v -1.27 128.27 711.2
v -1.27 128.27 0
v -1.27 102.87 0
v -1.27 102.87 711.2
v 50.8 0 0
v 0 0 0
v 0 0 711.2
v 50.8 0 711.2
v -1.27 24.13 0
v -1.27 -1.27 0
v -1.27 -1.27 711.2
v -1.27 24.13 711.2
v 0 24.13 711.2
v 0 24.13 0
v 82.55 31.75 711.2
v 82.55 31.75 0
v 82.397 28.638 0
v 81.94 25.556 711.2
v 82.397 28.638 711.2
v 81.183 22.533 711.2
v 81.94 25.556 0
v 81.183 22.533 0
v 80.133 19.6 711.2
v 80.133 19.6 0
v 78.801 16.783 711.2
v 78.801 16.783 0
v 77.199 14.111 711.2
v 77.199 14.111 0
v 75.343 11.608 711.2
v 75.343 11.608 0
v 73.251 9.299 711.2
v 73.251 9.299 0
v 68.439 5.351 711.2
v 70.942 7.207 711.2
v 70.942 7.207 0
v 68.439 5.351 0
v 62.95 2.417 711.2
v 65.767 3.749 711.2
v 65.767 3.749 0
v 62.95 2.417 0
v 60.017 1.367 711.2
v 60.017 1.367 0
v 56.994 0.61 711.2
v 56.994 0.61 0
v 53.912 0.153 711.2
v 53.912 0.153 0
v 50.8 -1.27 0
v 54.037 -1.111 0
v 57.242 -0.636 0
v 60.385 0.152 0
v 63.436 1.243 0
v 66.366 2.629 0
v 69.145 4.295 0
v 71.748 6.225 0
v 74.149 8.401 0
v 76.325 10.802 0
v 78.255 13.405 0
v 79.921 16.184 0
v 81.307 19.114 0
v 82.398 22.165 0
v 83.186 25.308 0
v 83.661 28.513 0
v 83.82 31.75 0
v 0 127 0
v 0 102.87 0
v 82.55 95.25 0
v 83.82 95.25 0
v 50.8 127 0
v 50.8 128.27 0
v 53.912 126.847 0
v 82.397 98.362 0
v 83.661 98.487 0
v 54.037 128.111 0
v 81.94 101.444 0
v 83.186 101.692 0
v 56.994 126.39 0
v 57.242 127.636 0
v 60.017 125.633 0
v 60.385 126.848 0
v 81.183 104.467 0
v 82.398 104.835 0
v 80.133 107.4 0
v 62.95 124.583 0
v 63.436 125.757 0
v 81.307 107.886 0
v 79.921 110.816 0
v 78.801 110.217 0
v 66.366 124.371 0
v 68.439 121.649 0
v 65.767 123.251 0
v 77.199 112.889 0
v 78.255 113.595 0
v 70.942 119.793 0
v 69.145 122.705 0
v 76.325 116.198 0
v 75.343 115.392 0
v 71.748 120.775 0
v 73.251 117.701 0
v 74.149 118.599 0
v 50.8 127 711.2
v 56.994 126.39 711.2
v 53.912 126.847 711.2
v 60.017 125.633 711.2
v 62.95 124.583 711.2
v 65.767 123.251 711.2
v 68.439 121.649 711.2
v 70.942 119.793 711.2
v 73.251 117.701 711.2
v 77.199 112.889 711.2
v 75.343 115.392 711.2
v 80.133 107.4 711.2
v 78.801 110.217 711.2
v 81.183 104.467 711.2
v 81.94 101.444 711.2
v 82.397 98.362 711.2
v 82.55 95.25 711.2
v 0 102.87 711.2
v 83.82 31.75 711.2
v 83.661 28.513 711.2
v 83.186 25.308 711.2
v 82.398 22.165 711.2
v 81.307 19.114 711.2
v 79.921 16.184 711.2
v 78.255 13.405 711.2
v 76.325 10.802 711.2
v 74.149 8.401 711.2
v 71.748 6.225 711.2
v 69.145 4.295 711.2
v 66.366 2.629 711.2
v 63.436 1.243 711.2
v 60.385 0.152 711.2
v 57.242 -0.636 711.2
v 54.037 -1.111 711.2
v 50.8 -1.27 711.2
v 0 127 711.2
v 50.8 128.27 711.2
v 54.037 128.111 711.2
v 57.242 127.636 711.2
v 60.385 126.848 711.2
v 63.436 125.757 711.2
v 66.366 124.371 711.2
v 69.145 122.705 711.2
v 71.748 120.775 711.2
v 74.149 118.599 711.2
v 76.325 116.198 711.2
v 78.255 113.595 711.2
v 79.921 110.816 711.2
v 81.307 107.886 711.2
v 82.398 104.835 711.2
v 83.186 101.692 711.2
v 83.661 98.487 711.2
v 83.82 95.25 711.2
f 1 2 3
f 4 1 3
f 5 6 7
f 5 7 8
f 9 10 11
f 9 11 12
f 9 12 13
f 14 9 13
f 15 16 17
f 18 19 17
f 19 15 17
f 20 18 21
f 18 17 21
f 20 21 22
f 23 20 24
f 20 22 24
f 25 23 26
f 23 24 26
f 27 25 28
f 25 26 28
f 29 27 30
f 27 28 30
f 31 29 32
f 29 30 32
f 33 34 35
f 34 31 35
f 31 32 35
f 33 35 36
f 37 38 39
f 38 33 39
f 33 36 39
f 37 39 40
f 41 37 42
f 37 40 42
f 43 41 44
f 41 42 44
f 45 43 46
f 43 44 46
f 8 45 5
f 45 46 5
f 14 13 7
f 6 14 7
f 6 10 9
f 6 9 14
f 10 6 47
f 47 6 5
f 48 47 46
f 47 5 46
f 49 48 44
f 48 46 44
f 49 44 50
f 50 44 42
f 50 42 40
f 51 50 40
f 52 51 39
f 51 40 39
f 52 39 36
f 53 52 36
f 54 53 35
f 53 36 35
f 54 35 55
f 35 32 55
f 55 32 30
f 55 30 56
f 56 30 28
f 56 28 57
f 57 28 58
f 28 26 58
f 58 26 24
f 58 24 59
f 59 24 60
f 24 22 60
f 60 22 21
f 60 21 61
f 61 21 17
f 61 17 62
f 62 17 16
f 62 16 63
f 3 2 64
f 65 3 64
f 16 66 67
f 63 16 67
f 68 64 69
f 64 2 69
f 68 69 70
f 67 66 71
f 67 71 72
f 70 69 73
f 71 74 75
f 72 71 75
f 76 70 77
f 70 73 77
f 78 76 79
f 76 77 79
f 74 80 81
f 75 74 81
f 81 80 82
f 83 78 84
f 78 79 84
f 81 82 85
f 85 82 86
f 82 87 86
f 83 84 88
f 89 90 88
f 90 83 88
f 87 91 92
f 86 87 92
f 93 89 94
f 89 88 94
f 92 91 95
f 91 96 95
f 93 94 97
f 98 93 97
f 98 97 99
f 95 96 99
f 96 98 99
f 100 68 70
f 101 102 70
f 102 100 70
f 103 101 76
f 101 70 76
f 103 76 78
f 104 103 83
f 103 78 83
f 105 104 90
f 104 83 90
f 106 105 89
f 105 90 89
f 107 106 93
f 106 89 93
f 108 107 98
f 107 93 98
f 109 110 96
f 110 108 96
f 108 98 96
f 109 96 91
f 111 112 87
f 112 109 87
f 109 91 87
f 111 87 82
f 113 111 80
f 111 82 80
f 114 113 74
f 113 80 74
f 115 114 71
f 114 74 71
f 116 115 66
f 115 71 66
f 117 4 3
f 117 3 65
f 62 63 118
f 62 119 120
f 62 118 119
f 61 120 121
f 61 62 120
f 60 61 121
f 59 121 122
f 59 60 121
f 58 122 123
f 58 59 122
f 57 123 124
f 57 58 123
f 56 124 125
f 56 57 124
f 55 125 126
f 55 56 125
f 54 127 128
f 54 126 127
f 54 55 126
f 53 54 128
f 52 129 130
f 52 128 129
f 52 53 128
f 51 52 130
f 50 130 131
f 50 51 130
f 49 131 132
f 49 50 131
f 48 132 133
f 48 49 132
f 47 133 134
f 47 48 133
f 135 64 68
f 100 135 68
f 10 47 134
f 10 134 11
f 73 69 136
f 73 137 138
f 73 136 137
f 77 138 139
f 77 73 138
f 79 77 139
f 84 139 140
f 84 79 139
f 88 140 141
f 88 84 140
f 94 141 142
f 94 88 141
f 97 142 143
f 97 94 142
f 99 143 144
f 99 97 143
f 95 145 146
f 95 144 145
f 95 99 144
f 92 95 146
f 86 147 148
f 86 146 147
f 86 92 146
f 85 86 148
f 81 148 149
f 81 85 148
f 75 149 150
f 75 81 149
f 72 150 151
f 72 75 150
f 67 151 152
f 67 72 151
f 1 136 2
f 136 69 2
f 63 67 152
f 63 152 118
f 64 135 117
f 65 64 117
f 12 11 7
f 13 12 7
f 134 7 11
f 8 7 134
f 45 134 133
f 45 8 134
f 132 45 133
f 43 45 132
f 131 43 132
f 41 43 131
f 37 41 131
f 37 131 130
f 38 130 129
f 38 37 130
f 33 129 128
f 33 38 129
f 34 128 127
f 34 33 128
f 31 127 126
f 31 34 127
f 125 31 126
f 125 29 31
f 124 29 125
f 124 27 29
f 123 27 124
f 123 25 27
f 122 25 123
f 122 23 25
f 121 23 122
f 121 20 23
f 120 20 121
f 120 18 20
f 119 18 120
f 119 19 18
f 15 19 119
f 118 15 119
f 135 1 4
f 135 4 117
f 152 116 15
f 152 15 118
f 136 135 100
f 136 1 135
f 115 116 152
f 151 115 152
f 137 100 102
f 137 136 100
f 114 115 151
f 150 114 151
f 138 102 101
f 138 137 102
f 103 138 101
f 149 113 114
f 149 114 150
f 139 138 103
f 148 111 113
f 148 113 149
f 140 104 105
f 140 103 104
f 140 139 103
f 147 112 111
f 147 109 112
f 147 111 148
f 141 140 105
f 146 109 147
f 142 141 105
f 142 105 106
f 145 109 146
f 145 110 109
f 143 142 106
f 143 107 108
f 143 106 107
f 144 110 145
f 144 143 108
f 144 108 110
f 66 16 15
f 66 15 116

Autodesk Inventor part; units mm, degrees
ref_plane "YZ Plane" through (0, 0, 0) normal (1, 0, 0) x (0, 1, 0)
ref_plane "XZ Plane" through (0, 0, 0) normal (0, 1, 0) x (-1, 0, 0)
ref_plane "XY Plane" through (0, 0, 0) normal (0, 0, 1) x (1, 0, 0)
sketch "Sketch1" plane through (0, 0, 0) normal (0, 0, 1) x (1, 0, 0)
  line L0 (0, 0) -> (19.05, 0) construction
  line L1 (19.05, 0) -> (19.05, 127) construction
  line L2 (19.05, 127) -> (0, 127) construction
  line L3 (0, 127) -> (0, 0) construction
  line L4 (19.05, 127) -> (82.55, 127) construction
  line L5 (82.55, 127) -> (82.55, 0) construction
  line L6 (82.55, 0) -> (19.05, 0) construction
  line L7 (19.05, 0) -> (19.05, 127) construction
  line L8 (0, 127) -> (50.8, 127)
  line L9 (50.8, 127) -> (50.8, 128.27)
  line L10 (50.8, 128.27) -> (0, 128.27)
  line L11 (0, 128.27) -> (0, 127)
  line L12 (0, 0) -> (50.8, 0)
  line L13 (50.8, 0) -> (50.8, -1.27)
  line L14 (50.8, -1.27) -> (0, -1.27)
  line L15 (0, -1.27) -> (0, 0)
  arc A0 (50.8, 0) -> (82.55, 31.75) centre (50.8, 31.75) ccw
  line L16 (50.8, 0) -> (82.55, 31.75) construction
  line L17 (50.8, 0) -> (95.7013, 0) construction
  arc A1 (82.55, 95.25) -> (50.8, 127) centre (50.8, 95.25) ccw
  line L18 (50.8, 127) -> (82.55, 95.25) construction
  line L19 (50.8, 127) -> (95.7013, 127) construction
  line L20 (82.55, 95.25) -> (83.82, 95.25)
  line L21 (83.82, 95.25) -> (83.82, 31.75)
  line L22 (83.82, 31.75) -> (82.55, 31.75)
  line L23 (82.55, 31.75) -> (82.55, 95.25)
  arc A2 (83.82, 95.25) -> (50.8, 128.27) centre (50.8, 95.25) ccw
  arc A3 (50.8, -1.27) -> (83.82, 31.75) centre (50.8, 31.75) ccw
  line L24 (82.55, 31.75) -> (83.82, 31.75)
  dimension "d0" = 19.05
  dimension "d1" = 127
  dimension "d2" = 63.5
  dimension "d3" = 127
  dimension "d4" = 50.8
  dimension "d5" = 1.27
  dimension "d6" = 50.8
  dimension "d7" = 1.27
  dimension "d8" = 45
  dimension "d9" = 31.75
  dimension "d10" = 45
  dimension "d11" = 31.75
  dimension "d12" = 1.27
  dimension "d13" = 63.5
  dimension "d14" = 33.02
  dimension "d15" = 33.02
extrude "Extrusion1" add sketch "Sketch1" along normal blind 711.2
sketch "Sketch2" plane through (0, 0, 711.2) normal (0, 0, 1) x (1, 0, 0)
  line L0 (50.8, 128.27) -> (0, 128.27) projected
  line L1 (0, 128.27) -> (0, 127) projected
  line L2 (0, 127) -> (50.8, 127) projected
  arc A0 (82.55, 95.25) -> (50.8, 127) centre (50.8, 95.25) ccw projected
  line L3 (82.55, 95.25) -> (82.55, 31.75) projected
  arc A1 (50.8, 0) -> (82.55, 31.75) centre (50.8, 31.75) ccw projected
  line L4 (50.8, 0) -> (0, 0) projected
  line L5 (0, 0) -> (0, -1.27) projected
  line L6 (0, -1.27) -> (50.8, -1.27) projected
  arc A2 (50.8, -1.27) -> (83.82, 31.75) centre (50.8, 31.75) ccw projected
  line L7 (83.82, 31.75) -> (83.82, 95.25) projected
  arc A3 (83.82, 95.25) -> (50.8, 128.27) centre (50.8, 95.25) ccw projected
  line L8 (0, 128.27) -> (-1.27, 128.27)
  line L9 (-1.27, 128.27) -> (-1.27, 102.87)
  line L10 (-1.27, 102.87) -> (0, 102.87)
  line L11 (0, 102.87) -> (0, 128.27)
  line L12 (0, -1.27) -> (-1.27, -1.27)
  line L13 (-1.27, -1.27) -> (-1.27, 24.13)
  line L14 (-1.27, 24.13) -> (0, 24.13)
  line L15 (0, 24.13) -> (0, -1.27)
  dimension "d18" = 1.27
  dimension "d19" = 25.4
  dimension "d20" = 1.27
  dimension "d21" = 25.4
extrude "Extrusion2" add sketch "Sketch2" against normal blind 711.2 contours L1 L11 L10 L9 L8 | L12 L13 L14 L15 L5
properties part number "bumper_cloth"
